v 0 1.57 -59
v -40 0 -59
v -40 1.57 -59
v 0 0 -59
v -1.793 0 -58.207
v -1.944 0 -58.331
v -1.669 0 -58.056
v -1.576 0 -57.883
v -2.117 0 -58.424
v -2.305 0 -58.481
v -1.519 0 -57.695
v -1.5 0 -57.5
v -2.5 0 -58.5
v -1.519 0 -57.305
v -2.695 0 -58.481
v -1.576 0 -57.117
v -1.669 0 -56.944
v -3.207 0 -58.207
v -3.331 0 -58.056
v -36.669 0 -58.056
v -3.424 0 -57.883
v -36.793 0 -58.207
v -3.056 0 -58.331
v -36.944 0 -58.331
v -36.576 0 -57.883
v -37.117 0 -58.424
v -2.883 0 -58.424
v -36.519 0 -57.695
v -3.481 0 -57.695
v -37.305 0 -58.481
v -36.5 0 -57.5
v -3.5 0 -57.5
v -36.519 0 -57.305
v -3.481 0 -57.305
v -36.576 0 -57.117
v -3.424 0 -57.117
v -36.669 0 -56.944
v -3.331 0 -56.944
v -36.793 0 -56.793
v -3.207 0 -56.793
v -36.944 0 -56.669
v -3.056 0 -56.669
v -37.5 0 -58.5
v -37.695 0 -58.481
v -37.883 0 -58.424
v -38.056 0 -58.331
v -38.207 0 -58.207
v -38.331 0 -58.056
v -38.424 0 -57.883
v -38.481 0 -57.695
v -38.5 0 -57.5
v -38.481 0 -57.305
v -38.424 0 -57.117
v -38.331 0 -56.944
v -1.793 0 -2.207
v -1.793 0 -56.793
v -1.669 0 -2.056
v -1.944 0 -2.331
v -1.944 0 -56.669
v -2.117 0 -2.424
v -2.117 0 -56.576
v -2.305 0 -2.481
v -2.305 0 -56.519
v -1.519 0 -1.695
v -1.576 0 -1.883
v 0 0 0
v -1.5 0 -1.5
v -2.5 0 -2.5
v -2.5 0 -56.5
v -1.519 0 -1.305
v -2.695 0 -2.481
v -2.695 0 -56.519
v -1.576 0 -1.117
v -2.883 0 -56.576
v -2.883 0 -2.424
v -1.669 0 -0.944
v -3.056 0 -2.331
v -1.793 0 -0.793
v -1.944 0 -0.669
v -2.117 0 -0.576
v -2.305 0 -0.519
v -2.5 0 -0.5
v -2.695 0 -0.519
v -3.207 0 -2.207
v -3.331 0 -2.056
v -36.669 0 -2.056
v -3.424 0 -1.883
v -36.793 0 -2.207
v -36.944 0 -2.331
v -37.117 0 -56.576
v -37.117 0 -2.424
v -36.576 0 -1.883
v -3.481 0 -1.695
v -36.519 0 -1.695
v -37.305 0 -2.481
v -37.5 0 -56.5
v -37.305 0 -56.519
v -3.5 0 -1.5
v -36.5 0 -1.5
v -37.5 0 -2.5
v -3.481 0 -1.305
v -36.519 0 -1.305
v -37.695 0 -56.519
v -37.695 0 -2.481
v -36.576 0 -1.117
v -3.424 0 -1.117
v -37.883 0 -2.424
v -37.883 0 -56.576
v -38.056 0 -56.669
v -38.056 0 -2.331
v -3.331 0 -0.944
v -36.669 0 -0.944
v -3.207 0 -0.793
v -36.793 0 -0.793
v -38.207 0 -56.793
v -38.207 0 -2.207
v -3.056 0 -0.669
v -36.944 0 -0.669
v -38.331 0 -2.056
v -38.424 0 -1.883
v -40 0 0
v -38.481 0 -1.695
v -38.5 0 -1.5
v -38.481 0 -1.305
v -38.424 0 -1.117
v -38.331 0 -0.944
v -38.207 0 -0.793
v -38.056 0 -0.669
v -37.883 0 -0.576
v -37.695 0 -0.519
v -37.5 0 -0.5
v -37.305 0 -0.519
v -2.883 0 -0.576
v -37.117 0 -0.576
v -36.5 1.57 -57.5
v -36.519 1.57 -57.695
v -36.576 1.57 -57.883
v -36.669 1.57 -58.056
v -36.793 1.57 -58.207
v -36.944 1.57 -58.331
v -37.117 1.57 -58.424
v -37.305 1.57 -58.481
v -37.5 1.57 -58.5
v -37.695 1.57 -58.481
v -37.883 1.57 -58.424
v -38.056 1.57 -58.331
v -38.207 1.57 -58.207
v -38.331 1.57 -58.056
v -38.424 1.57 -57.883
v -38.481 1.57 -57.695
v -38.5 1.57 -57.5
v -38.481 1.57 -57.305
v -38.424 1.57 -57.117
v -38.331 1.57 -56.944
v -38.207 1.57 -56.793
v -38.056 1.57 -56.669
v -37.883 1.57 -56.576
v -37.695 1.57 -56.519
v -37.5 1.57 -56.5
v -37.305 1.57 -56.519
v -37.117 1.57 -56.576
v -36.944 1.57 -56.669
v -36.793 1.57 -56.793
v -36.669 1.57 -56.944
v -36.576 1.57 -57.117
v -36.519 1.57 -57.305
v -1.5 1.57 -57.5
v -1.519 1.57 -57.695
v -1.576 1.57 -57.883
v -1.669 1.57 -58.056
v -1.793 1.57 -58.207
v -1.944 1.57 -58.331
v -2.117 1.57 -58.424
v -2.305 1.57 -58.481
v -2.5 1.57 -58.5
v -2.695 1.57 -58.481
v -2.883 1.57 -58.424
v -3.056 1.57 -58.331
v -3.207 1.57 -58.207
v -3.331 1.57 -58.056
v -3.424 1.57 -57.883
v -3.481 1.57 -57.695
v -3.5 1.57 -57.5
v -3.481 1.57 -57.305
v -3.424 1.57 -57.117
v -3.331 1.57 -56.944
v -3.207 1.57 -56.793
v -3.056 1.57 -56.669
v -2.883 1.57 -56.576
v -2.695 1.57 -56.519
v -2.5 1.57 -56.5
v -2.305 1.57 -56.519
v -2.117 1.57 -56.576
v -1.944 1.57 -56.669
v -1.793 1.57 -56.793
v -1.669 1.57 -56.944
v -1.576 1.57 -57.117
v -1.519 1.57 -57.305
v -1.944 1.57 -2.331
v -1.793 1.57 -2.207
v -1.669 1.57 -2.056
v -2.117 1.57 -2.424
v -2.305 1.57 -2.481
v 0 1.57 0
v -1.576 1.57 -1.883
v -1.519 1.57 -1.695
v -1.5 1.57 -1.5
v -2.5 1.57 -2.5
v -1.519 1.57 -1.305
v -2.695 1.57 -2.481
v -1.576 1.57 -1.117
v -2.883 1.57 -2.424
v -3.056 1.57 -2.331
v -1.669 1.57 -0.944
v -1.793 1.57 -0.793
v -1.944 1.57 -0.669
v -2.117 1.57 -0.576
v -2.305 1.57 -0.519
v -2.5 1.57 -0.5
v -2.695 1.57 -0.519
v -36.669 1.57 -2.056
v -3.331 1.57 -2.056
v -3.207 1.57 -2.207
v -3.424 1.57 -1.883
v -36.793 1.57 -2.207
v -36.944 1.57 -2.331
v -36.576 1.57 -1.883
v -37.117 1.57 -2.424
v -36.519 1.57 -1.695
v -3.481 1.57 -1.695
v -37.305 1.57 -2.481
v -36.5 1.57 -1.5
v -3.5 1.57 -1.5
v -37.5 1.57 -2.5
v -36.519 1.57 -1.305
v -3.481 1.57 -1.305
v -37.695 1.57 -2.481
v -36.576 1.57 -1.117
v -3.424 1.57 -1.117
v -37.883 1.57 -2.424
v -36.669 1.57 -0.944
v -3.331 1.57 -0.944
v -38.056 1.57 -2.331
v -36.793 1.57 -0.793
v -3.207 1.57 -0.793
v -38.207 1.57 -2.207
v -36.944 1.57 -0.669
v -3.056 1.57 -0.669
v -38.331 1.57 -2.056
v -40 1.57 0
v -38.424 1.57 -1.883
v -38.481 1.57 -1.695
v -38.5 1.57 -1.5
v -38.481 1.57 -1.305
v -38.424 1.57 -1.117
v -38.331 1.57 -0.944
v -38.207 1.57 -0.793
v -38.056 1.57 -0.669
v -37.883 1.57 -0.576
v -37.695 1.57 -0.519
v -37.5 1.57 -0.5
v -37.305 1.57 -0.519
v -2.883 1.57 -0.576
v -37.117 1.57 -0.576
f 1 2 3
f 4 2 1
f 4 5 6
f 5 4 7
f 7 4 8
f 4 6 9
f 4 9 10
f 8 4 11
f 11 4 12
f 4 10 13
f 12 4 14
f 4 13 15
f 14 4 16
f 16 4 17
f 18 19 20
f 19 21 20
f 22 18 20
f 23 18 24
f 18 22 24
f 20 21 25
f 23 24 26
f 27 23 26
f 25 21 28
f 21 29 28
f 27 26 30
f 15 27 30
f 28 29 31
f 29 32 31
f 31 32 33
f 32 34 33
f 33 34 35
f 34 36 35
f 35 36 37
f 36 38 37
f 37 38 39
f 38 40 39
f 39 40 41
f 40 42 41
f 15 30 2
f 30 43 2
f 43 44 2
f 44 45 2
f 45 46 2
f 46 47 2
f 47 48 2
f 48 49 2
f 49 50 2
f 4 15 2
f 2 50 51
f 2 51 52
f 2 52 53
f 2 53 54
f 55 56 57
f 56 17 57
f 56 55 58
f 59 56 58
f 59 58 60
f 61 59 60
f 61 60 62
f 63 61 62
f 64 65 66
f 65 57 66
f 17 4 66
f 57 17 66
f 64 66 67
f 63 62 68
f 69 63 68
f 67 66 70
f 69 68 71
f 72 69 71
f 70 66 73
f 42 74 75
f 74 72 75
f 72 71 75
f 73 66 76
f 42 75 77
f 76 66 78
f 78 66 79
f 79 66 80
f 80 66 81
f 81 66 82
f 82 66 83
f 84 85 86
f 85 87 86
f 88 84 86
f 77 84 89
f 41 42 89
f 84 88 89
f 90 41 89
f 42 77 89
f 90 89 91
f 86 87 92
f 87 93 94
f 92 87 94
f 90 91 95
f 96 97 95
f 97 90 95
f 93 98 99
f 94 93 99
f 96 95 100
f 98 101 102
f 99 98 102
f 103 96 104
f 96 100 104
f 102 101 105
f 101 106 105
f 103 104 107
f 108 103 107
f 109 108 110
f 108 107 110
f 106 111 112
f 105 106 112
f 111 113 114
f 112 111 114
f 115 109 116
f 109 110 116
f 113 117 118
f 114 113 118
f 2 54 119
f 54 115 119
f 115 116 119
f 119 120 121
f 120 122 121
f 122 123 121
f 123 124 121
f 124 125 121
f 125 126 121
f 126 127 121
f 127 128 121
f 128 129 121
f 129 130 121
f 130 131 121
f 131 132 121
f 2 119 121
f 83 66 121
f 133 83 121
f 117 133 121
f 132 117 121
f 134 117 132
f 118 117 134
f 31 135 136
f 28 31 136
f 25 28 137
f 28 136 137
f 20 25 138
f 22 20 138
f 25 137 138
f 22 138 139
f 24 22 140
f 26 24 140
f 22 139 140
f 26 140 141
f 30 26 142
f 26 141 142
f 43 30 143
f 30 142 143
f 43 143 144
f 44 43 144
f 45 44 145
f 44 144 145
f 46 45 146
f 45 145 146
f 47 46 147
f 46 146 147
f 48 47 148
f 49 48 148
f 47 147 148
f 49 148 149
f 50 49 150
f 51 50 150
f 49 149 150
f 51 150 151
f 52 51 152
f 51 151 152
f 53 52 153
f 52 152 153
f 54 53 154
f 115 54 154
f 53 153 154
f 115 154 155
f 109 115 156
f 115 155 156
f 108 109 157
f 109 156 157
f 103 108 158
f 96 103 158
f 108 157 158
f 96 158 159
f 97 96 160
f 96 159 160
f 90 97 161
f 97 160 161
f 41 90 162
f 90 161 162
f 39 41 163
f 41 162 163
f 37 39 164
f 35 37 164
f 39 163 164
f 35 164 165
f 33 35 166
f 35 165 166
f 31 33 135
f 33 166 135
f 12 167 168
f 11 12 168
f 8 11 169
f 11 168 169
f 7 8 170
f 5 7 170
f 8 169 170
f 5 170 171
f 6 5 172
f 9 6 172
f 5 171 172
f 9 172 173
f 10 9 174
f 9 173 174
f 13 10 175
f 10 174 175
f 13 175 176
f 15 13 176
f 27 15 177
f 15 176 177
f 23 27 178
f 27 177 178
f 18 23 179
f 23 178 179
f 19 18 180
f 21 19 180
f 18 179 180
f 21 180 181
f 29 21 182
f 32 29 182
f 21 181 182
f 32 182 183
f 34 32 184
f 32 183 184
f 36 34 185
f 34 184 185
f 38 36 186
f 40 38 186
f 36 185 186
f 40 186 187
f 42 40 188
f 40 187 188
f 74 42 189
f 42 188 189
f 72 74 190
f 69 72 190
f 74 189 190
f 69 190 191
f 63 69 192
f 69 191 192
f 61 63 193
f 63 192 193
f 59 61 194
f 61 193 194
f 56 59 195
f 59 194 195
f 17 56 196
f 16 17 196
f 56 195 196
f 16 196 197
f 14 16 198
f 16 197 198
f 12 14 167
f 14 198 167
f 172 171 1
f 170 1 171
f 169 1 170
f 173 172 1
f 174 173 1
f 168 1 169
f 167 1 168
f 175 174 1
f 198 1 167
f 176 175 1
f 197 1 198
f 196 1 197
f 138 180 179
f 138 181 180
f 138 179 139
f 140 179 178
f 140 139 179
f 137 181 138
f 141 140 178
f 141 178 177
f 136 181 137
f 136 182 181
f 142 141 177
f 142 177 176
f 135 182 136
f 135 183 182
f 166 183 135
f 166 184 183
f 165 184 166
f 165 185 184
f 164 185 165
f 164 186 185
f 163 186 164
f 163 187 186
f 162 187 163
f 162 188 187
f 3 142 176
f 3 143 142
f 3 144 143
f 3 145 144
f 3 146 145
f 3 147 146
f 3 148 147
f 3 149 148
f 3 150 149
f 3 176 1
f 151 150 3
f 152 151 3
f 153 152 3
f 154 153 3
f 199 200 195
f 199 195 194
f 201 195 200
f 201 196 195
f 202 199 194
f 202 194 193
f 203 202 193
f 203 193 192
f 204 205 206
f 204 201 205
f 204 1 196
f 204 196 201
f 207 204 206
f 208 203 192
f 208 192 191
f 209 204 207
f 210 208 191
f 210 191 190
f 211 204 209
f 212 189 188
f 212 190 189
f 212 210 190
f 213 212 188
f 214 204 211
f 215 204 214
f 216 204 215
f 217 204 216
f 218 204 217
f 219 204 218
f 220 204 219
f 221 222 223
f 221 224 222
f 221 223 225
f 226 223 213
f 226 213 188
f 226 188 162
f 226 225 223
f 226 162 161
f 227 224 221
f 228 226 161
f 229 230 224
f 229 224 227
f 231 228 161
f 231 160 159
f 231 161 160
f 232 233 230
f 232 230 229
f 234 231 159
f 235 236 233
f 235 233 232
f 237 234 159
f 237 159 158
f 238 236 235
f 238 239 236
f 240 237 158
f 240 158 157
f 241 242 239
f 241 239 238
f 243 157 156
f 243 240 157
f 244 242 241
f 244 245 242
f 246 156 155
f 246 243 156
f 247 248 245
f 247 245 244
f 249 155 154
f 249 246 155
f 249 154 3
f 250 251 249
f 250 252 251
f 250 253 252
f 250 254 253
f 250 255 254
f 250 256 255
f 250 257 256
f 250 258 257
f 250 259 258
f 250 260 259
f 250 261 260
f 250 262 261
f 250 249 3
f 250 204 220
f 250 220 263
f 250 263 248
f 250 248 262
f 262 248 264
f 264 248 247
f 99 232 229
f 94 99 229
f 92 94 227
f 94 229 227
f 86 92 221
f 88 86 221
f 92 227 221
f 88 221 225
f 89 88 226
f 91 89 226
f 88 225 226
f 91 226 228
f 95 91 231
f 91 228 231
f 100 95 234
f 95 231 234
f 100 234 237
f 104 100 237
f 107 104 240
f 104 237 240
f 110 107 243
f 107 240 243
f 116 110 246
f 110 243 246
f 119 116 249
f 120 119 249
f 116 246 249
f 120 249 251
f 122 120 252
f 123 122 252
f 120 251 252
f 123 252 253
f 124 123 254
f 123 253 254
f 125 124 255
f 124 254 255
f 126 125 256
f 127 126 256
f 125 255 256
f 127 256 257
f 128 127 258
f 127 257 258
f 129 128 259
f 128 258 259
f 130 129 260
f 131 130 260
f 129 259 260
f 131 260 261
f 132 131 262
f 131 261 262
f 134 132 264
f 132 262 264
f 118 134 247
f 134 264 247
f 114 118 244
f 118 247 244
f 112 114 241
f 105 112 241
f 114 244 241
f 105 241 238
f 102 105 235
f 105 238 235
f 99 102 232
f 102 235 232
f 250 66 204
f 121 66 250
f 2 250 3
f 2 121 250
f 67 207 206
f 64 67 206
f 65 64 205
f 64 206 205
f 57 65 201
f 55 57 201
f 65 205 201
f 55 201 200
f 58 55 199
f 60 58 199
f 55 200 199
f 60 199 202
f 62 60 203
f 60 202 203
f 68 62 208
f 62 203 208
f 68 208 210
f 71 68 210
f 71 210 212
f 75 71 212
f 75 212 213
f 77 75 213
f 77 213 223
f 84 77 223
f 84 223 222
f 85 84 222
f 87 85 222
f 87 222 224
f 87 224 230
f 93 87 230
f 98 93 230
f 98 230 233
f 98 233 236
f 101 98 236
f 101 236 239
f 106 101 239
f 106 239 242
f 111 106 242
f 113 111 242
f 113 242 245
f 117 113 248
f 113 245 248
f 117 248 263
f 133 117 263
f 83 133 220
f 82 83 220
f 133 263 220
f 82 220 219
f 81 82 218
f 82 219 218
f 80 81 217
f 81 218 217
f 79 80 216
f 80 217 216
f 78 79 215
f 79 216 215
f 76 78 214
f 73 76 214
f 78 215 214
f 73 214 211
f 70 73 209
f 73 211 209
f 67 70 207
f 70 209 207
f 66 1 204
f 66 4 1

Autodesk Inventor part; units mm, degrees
ref_plane "YZ Plane" through (0, 0, 0) normal (1, 0, 0) x (0, 1, 0)
ref_plane "XZ Plane" through (0, 0, 0) normal (0, 1, 0) x (-1, 0, 0)
ref_plane "XY Plane" through (0, 0, 0) normal (0, 0, 1) x (1, 0, 0)
sketch "Sketch1" plane through (0, 0, 0) normal (0, 1, 0) x (-1, 0, 0)
  line L0 (0, 0) -> (40, 0)
  line L1 (40, 0) -> (40, -59)
  line L2 (40, -59) -> (0, -59)
  line L3 (0, -59) -> (0, 0)
  dimension "d0" = 40
  dimension "d1" = 59
extrude "Extrusion1" add sketch "Sketch1" along normal blind 1.57
sketch "Sketch2" plane through (0, 1.57, 0) normal (0, 1, 0) x (1, 0, 0)
  circle A0 centre (-37.5, 1.5) radius 1
  line L0 (-40, 59) -> (-40, 0) projected
  line L1 (-40, 0) -> (0, 0) projected
  line L2 (0, 59) -> (-40, 59) projected
  line L3 (-40, 59) -> (-40, 0) projected
  line L4 (-40, 0) -> (0, 0) projected
  line L5 (0, 0) -> (0, 59) projected
  line L6 (0, 0) -> (0, 59) projected
  line L7 (0, 59) -> (-40, 59) projected
  line L8 (0, 29.5) -> (-40, 29.5)
  line L9 (-20, 0) -> (-20, 59)
  circle A1 centre (-37.5, 57.5) radius 1
  circle A2 centre (-2.5, 1.5) radius 1
  circle A3 centre (-2.5, 57.5) radius 1
  dimension "d4" = 2
  dimension "d5" = 2.5
  dimension "d6" = 1.5
extrude "Extrusion2" cut sketch "Sketch2" against normal blind 2 contours A0 | A1 | A2 | A3
equation "\"d7\" = d4"
properties part number "pcb sola" material "Steel, Mild, Welded"
